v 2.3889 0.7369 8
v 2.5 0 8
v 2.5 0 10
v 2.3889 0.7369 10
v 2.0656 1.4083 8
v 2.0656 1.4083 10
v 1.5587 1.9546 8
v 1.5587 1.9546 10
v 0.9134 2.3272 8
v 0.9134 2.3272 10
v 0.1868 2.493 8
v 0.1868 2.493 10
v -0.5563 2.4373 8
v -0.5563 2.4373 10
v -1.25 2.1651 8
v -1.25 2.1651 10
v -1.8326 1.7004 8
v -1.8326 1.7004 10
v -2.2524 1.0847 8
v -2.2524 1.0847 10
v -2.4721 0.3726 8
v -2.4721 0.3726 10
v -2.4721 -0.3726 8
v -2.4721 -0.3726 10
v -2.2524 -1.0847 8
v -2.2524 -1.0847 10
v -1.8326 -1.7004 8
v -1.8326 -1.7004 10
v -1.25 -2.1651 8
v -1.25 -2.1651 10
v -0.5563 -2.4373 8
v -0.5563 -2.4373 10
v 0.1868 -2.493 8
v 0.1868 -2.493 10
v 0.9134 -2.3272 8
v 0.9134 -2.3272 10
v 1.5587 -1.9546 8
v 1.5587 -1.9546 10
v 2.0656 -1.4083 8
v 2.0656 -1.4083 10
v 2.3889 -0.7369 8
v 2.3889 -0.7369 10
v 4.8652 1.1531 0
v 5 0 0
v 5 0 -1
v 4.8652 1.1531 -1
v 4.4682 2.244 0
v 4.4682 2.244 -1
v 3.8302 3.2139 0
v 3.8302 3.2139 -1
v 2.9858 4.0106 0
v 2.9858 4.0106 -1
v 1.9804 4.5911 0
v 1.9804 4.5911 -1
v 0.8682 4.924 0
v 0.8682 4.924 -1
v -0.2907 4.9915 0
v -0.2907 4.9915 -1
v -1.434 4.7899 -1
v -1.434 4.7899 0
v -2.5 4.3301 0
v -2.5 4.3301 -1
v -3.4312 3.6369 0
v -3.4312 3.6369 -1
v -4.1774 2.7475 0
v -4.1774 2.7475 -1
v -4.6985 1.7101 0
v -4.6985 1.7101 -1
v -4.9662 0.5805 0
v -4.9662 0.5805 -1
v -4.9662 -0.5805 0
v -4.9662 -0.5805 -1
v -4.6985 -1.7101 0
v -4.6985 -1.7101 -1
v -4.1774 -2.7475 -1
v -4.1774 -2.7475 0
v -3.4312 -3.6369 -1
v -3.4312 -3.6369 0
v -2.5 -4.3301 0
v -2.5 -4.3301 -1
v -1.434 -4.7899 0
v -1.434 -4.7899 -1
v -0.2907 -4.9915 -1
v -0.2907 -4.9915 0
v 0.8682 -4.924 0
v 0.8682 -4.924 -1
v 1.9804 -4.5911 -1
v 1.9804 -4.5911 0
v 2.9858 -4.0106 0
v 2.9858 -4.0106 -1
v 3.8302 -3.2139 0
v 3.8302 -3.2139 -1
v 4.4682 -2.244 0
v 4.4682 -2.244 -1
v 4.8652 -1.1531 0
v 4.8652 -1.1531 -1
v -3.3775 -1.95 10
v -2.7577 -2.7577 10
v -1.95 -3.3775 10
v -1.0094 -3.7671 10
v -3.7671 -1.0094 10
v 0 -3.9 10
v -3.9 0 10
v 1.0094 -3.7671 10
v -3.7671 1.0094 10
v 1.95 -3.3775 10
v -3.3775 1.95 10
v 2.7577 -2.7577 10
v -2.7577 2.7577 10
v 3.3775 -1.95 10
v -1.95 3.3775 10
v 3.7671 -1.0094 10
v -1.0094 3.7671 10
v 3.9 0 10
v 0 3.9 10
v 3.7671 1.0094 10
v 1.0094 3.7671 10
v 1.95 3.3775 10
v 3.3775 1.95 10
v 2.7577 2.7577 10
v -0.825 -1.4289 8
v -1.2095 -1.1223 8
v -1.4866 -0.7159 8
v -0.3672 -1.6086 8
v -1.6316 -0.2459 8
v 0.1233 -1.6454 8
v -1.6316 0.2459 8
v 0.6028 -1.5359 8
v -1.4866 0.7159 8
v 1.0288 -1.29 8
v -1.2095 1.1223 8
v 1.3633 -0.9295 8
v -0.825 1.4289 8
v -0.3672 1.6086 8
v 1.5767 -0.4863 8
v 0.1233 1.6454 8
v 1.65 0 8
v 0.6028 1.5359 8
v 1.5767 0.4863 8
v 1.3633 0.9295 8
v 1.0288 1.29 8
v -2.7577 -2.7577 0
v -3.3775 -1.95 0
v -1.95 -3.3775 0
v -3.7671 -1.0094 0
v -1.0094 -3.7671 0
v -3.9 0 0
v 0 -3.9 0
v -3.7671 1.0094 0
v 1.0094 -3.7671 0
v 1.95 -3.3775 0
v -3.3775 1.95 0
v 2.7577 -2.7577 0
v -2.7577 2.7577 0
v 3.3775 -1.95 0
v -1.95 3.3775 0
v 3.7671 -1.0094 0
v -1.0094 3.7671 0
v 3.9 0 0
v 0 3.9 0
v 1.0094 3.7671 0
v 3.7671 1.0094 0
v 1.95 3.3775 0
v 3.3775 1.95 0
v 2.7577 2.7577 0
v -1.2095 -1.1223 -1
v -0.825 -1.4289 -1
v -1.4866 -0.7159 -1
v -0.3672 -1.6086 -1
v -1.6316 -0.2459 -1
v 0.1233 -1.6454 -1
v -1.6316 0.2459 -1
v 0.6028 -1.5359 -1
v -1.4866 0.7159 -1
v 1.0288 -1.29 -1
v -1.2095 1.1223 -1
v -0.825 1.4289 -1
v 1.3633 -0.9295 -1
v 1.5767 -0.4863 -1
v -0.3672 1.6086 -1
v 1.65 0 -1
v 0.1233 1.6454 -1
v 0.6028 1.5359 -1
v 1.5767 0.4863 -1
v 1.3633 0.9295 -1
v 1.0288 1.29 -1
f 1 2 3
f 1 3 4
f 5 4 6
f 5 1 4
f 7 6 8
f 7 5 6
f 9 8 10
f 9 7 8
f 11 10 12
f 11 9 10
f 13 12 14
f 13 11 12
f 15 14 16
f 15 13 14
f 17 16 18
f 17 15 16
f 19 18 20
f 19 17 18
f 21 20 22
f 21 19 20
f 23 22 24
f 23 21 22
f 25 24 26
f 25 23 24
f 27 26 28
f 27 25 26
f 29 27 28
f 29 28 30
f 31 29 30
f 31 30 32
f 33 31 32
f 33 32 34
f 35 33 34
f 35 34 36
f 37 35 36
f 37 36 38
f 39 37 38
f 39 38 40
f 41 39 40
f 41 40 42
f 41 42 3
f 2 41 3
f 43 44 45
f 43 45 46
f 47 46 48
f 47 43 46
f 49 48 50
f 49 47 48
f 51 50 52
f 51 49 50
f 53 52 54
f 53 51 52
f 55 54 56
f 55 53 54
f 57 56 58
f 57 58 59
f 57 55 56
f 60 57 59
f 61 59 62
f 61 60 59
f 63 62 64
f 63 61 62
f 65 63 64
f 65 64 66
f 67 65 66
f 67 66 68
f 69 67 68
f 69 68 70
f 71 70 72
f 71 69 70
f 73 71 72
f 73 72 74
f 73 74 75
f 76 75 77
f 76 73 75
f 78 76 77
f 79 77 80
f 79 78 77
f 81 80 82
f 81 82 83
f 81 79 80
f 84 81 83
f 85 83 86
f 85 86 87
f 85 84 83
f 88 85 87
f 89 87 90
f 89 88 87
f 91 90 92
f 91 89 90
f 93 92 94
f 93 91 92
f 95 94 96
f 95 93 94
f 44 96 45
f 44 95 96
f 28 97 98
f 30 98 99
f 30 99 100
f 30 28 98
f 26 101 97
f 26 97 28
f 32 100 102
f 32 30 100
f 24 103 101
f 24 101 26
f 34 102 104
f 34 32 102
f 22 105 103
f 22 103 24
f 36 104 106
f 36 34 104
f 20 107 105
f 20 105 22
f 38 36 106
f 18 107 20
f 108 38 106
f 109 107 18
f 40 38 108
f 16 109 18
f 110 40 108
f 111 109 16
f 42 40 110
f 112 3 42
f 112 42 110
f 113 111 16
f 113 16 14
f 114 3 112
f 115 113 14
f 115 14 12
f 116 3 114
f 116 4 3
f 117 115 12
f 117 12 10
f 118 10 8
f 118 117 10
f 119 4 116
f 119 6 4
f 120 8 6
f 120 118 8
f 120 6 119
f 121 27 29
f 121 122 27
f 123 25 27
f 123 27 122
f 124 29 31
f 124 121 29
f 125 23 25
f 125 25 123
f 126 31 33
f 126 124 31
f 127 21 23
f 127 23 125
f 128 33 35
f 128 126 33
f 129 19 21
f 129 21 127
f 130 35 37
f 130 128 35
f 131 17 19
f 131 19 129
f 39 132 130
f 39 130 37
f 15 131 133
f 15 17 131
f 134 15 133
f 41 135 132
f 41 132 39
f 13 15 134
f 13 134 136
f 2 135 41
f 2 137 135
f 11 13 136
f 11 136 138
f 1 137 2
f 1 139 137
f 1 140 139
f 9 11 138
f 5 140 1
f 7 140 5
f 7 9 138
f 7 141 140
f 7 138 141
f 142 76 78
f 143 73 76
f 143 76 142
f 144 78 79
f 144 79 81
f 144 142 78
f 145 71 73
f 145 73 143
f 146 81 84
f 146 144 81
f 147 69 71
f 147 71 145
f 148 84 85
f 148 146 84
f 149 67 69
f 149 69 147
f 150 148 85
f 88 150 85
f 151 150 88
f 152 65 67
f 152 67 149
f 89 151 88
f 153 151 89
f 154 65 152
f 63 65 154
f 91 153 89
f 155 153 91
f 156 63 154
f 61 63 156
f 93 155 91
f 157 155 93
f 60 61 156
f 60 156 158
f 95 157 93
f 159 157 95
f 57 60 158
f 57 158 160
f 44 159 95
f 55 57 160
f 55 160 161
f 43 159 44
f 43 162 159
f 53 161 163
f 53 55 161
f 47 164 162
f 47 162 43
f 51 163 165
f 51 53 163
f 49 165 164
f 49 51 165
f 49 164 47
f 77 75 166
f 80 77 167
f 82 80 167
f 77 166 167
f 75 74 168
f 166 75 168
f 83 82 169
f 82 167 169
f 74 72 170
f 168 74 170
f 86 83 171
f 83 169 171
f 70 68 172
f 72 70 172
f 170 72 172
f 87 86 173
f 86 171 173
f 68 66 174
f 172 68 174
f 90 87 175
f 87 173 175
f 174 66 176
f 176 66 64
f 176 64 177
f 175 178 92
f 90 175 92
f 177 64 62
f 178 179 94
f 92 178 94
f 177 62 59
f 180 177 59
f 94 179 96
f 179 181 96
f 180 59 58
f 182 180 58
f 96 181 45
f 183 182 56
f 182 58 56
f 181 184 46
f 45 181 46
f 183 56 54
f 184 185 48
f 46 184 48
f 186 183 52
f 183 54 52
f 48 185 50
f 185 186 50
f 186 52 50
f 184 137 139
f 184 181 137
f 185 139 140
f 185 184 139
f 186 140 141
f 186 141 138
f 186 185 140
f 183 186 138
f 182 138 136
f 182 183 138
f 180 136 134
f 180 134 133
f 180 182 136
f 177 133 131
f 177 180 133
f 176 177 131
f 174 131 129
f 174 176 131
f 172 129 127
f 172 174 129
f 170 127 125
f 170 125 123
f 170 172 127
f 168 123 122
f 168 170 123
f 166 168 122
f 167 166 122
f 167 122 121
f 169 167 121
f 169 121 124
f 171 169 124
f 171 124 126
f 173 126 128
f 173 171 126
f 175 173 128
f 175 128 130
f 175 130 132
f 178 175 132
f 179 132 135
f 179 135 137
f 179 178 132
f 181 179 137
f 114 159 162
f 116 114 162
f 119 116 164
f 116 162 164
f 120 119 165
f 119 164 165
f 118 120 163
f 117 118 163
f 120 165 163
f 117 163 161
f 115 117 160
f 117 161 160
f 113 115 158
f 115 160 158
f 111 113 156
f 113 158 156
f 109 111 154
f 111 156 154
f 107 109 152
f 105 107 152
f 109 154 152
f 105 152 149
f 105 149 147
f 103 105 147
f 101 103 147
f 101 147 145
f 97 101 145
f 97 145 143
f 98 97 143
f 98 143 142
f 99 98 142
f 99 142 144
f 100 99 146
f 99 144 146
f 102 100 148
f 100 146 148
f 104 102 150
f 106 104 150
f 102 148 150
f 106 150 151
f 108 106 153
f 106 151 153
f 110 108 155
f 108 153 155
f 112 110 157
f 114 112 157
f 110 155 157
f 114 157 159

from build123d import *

# Parameters (mm, degrees)
SKETCH1_R           = 5
SKETCH1_R_2         = 1.65
BOSS_EXTRUDE1_DEPTH = 1
SKETCH1_3_R         = 3.9
SKETCH1_3_R_2       = 2.5
BOSS_EXTRUDE2_DEPTH = 10
SKETCH1_4_R         = 2.5
SKETCH1_4_R_2       = 1.65
BOSS_EXTRUDE3_DEPTH = 8


with BuildPart() as part:
    # Sketch1 → Boss-Extrude1 (new body)
    with BuildSketch(Plane.XY):
        Circle(SKETCH1_R)
        Circle(SKETCH1_R_2, mode=Mode.SUBTRACT)
    extrude(amount=-BOSS_EXTRUDE1_DEPTH)

    # Sketch1<3> → Boss-Extrude2 (add)
    with BuildSketch(Plane.XY):
        Circle(SKETCH1_3_R)
        Circle(SKETCH1_3_R_2, mode=Mode.SUBTRACT)
    extrude(amount=BOSS_EXTRUDE2_DEPTH)

    # Sketch1<4> → Boss-Extrude3 (add)
    with BuildSketch(Plane.XY):
        Circle(SKETCH1_4_R)
        Circle(SKETCH1_4_R_2, mode=Mode.SUBTRACT)
    extrude(amount=BOSS_EXTRUDE3_DEPTH)


solid = part.part
